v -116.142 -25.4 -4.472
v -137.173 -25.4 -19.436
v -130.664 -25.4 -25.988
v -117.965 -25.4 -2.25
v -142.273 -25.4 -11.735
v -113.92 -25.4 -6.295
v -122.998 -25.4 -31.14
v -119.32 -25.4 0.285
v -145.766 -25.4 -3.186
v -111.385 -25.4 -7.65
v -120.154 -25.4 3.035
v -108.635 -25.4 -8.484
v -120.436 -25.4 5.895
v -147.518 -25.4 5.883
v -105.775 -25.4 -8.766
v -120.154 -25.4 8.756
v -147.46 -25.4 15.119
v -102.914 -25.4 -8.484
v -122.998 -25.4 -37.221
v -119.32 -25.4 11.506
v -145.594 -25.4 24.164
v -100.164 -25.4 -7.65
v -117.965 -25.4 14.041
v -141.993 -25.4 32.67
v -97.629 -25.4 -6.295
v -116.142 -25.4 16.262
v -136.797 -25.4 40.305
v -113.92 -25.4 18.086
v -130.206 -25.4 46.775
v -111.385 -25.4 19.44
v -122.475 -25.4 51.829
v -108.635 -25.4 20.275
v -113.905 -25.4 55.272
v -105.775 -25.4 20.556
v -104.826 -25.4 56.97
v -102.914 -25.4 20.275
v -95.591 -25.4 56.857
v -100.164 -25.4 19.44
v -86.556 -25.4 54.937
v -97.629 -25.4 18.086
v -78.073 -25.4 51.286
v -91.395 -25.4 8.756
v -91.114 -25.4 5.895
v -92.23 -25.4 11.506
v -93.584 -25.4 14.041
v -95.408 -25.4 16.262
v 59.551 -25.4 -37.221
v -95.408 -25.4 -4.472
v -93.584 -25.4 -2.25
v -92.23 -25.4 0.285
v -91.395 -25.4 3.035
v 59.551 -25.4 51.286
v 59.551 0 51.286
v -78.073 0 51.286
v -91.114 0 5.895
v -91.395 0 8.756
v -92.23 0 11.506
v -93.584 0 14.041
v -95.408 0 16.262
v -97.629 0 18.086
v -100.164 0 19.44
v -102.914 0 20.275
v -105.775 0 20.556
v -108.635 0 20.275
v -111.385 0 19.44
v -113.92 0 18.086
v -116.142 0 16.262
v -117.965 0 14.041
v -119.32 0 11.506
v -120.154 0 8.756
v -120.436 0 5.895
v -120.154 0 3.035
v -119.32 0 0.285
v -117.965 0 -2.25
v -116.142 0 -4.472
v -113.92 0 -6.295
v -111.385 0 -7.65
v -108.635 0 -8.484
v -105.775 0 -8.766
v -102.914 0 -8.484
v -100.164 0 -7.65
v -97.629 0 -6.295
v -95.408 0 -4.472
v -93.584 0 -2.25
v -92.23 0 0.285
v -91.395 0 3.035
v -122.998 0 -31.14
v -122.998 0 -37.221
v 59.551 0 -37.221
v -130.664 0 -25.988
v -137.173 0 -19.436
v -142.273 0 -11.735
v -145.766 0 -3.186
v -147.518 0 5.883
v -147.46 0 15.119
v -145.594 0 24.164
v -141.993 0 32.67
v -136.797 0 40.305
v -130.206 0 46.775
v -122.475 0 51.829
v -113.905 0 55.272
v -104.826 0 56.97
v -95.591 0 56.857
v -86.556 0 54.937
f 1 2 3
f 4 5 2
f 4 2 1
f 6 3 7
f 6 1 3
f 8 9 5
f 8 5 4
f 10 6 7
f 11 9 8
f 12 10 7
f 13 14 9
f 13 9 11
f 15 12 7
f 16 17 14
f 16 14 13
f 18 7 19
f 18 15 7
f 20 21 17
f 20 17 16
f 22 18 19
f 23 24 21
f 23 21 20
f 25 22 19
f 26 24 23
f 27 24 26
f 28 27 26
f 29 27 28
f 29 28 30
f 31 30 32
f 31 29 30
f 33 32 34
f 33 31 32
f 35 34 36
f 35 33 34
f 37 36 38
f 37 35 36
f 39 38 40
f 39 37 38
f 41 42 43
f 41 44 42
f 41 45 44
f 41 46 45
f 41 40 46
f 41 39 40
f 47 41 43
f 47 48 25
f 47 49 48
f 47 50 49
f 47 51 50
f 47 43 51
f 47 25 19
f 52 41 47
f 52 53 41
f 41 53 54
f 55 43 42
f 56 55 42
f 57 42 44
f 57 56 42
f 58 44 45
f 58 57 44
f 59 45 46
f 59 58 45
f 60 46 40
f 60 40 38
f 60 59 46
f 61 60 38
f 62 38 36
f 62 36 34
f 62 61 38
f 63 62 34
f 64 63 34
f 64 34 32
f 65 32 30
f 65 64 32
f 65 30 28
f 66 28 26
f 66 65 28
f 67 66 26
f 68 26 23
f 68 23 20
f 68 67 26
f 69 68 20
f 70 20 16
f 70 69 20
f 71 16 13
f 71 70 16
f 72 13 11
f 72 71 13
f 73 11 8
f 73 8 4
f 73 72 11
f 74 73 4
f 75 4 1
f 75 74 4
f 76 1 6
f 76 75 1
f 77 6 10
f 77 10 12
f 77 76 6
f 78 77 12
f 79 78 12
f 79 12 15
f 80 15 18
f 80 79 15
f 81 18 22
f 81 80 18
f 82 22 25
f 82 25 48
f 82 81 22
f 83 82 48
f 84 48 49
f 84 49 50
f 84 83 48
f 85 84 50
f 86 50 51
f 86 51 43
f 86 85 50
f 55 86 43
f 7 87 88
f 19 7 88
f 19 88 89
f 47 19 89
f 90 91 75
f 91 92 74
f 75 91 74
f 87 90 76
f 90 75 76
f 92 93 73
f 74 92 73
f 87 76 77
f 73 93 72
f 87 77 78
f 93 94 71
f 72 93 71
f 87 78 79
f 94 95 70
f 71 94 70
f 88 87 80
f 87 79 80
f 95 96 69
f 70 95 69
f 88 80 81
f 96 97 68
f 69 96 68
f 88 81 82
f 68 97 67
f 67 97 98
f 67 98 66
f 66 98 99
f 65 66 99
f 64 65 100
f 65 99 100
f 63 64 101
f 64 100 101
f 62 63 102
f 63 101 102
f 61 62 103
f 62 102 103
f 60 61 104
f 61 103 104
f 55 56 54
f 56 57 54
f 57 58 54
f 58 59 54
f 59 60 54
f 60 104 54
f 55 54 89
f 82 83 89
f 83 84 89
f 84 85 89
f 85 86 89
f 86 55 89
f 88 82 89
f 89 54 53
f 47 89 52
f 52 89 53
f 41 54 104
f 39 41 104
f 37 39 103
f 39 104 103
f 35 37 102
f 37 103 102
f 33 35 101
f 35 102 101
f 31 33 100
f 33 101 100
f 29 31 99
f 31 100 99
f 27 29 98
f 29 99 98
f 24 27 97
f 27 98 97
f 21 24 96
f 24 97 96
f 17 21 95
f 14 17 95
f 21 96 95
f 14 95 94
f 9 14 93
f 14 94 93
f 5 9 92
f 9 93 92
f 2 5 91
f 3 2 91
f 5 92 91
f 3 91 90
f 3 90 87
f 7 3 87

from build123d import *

# Parameters (mm, degrees)
F0_R     = 14.661105288
F1_DEPTH = 25.4


with BuildPart() as f1:
    # F0 (on Front) → F1 (new body)
    with BuildSketch(Plane.XZ):
        with BuildLine():
            Line((-122.9979321361, -31.1395347035), (-122.9979321361, 51.2862093747))
            Line((-122.9979321361, 51.2862093747), (-78.072603986, 51.2862093747))
            ThreePointArc((-78.072603986, 51.2862093747), (-141.9933466372, 32.6696487834), (-122.9979321361, -31.1395347035))
        make_face()
        with BuildLine():
            Line((-78.072603986, 51.2862093747), (-122.9979321361, 51.2862093747))
            Line((-122.9979321361, 51.2862093747), (-122.9979321361, -31.1395347035))
            ThreePointArc((-122.9979321361, -31.1395347035), (-76.693666618, -30.0800117713), (-53.8420287336, 10.2065894753))
            ThreePointArc((-53.8420287336, 10.2065894753), (-60.3509770341, 34.0532661208), (-78.072603986, 51.2862093747))
        make_face()
        with Locations((-105.7746484876, 5.8953254484)):
            Circle(F0_R, mode=Mode.SUBTRACT)
        with BuildLine():
            Line((59.5510303974, 51.2862093747), (-78.072603986, 51.2862093747))
            ThreePointArc((-78.072603986, 51.2862093747), (-60.3509770341, 34.0532661208), (-53.8420287336, 10.2065894753))
            ThreePointArc((-53.8420287336, 10.2065894753), (-76.693666618, -30.0800117713), (-122.9979321361, -31.1395347035))
            Line((-122.9979321361, -31.1395347035), (-122.9979321361, -37.2208170593))
            Line((-122.9979321361, -37.2208170593), (59.5510303974, -37.2208170593))
            Line((59.5510303974, -37.2208170593), (59.5510303974, 51.2862093747))
        make_face()
    extrude(amount=F1_DEPTH)


solid = f1.part
